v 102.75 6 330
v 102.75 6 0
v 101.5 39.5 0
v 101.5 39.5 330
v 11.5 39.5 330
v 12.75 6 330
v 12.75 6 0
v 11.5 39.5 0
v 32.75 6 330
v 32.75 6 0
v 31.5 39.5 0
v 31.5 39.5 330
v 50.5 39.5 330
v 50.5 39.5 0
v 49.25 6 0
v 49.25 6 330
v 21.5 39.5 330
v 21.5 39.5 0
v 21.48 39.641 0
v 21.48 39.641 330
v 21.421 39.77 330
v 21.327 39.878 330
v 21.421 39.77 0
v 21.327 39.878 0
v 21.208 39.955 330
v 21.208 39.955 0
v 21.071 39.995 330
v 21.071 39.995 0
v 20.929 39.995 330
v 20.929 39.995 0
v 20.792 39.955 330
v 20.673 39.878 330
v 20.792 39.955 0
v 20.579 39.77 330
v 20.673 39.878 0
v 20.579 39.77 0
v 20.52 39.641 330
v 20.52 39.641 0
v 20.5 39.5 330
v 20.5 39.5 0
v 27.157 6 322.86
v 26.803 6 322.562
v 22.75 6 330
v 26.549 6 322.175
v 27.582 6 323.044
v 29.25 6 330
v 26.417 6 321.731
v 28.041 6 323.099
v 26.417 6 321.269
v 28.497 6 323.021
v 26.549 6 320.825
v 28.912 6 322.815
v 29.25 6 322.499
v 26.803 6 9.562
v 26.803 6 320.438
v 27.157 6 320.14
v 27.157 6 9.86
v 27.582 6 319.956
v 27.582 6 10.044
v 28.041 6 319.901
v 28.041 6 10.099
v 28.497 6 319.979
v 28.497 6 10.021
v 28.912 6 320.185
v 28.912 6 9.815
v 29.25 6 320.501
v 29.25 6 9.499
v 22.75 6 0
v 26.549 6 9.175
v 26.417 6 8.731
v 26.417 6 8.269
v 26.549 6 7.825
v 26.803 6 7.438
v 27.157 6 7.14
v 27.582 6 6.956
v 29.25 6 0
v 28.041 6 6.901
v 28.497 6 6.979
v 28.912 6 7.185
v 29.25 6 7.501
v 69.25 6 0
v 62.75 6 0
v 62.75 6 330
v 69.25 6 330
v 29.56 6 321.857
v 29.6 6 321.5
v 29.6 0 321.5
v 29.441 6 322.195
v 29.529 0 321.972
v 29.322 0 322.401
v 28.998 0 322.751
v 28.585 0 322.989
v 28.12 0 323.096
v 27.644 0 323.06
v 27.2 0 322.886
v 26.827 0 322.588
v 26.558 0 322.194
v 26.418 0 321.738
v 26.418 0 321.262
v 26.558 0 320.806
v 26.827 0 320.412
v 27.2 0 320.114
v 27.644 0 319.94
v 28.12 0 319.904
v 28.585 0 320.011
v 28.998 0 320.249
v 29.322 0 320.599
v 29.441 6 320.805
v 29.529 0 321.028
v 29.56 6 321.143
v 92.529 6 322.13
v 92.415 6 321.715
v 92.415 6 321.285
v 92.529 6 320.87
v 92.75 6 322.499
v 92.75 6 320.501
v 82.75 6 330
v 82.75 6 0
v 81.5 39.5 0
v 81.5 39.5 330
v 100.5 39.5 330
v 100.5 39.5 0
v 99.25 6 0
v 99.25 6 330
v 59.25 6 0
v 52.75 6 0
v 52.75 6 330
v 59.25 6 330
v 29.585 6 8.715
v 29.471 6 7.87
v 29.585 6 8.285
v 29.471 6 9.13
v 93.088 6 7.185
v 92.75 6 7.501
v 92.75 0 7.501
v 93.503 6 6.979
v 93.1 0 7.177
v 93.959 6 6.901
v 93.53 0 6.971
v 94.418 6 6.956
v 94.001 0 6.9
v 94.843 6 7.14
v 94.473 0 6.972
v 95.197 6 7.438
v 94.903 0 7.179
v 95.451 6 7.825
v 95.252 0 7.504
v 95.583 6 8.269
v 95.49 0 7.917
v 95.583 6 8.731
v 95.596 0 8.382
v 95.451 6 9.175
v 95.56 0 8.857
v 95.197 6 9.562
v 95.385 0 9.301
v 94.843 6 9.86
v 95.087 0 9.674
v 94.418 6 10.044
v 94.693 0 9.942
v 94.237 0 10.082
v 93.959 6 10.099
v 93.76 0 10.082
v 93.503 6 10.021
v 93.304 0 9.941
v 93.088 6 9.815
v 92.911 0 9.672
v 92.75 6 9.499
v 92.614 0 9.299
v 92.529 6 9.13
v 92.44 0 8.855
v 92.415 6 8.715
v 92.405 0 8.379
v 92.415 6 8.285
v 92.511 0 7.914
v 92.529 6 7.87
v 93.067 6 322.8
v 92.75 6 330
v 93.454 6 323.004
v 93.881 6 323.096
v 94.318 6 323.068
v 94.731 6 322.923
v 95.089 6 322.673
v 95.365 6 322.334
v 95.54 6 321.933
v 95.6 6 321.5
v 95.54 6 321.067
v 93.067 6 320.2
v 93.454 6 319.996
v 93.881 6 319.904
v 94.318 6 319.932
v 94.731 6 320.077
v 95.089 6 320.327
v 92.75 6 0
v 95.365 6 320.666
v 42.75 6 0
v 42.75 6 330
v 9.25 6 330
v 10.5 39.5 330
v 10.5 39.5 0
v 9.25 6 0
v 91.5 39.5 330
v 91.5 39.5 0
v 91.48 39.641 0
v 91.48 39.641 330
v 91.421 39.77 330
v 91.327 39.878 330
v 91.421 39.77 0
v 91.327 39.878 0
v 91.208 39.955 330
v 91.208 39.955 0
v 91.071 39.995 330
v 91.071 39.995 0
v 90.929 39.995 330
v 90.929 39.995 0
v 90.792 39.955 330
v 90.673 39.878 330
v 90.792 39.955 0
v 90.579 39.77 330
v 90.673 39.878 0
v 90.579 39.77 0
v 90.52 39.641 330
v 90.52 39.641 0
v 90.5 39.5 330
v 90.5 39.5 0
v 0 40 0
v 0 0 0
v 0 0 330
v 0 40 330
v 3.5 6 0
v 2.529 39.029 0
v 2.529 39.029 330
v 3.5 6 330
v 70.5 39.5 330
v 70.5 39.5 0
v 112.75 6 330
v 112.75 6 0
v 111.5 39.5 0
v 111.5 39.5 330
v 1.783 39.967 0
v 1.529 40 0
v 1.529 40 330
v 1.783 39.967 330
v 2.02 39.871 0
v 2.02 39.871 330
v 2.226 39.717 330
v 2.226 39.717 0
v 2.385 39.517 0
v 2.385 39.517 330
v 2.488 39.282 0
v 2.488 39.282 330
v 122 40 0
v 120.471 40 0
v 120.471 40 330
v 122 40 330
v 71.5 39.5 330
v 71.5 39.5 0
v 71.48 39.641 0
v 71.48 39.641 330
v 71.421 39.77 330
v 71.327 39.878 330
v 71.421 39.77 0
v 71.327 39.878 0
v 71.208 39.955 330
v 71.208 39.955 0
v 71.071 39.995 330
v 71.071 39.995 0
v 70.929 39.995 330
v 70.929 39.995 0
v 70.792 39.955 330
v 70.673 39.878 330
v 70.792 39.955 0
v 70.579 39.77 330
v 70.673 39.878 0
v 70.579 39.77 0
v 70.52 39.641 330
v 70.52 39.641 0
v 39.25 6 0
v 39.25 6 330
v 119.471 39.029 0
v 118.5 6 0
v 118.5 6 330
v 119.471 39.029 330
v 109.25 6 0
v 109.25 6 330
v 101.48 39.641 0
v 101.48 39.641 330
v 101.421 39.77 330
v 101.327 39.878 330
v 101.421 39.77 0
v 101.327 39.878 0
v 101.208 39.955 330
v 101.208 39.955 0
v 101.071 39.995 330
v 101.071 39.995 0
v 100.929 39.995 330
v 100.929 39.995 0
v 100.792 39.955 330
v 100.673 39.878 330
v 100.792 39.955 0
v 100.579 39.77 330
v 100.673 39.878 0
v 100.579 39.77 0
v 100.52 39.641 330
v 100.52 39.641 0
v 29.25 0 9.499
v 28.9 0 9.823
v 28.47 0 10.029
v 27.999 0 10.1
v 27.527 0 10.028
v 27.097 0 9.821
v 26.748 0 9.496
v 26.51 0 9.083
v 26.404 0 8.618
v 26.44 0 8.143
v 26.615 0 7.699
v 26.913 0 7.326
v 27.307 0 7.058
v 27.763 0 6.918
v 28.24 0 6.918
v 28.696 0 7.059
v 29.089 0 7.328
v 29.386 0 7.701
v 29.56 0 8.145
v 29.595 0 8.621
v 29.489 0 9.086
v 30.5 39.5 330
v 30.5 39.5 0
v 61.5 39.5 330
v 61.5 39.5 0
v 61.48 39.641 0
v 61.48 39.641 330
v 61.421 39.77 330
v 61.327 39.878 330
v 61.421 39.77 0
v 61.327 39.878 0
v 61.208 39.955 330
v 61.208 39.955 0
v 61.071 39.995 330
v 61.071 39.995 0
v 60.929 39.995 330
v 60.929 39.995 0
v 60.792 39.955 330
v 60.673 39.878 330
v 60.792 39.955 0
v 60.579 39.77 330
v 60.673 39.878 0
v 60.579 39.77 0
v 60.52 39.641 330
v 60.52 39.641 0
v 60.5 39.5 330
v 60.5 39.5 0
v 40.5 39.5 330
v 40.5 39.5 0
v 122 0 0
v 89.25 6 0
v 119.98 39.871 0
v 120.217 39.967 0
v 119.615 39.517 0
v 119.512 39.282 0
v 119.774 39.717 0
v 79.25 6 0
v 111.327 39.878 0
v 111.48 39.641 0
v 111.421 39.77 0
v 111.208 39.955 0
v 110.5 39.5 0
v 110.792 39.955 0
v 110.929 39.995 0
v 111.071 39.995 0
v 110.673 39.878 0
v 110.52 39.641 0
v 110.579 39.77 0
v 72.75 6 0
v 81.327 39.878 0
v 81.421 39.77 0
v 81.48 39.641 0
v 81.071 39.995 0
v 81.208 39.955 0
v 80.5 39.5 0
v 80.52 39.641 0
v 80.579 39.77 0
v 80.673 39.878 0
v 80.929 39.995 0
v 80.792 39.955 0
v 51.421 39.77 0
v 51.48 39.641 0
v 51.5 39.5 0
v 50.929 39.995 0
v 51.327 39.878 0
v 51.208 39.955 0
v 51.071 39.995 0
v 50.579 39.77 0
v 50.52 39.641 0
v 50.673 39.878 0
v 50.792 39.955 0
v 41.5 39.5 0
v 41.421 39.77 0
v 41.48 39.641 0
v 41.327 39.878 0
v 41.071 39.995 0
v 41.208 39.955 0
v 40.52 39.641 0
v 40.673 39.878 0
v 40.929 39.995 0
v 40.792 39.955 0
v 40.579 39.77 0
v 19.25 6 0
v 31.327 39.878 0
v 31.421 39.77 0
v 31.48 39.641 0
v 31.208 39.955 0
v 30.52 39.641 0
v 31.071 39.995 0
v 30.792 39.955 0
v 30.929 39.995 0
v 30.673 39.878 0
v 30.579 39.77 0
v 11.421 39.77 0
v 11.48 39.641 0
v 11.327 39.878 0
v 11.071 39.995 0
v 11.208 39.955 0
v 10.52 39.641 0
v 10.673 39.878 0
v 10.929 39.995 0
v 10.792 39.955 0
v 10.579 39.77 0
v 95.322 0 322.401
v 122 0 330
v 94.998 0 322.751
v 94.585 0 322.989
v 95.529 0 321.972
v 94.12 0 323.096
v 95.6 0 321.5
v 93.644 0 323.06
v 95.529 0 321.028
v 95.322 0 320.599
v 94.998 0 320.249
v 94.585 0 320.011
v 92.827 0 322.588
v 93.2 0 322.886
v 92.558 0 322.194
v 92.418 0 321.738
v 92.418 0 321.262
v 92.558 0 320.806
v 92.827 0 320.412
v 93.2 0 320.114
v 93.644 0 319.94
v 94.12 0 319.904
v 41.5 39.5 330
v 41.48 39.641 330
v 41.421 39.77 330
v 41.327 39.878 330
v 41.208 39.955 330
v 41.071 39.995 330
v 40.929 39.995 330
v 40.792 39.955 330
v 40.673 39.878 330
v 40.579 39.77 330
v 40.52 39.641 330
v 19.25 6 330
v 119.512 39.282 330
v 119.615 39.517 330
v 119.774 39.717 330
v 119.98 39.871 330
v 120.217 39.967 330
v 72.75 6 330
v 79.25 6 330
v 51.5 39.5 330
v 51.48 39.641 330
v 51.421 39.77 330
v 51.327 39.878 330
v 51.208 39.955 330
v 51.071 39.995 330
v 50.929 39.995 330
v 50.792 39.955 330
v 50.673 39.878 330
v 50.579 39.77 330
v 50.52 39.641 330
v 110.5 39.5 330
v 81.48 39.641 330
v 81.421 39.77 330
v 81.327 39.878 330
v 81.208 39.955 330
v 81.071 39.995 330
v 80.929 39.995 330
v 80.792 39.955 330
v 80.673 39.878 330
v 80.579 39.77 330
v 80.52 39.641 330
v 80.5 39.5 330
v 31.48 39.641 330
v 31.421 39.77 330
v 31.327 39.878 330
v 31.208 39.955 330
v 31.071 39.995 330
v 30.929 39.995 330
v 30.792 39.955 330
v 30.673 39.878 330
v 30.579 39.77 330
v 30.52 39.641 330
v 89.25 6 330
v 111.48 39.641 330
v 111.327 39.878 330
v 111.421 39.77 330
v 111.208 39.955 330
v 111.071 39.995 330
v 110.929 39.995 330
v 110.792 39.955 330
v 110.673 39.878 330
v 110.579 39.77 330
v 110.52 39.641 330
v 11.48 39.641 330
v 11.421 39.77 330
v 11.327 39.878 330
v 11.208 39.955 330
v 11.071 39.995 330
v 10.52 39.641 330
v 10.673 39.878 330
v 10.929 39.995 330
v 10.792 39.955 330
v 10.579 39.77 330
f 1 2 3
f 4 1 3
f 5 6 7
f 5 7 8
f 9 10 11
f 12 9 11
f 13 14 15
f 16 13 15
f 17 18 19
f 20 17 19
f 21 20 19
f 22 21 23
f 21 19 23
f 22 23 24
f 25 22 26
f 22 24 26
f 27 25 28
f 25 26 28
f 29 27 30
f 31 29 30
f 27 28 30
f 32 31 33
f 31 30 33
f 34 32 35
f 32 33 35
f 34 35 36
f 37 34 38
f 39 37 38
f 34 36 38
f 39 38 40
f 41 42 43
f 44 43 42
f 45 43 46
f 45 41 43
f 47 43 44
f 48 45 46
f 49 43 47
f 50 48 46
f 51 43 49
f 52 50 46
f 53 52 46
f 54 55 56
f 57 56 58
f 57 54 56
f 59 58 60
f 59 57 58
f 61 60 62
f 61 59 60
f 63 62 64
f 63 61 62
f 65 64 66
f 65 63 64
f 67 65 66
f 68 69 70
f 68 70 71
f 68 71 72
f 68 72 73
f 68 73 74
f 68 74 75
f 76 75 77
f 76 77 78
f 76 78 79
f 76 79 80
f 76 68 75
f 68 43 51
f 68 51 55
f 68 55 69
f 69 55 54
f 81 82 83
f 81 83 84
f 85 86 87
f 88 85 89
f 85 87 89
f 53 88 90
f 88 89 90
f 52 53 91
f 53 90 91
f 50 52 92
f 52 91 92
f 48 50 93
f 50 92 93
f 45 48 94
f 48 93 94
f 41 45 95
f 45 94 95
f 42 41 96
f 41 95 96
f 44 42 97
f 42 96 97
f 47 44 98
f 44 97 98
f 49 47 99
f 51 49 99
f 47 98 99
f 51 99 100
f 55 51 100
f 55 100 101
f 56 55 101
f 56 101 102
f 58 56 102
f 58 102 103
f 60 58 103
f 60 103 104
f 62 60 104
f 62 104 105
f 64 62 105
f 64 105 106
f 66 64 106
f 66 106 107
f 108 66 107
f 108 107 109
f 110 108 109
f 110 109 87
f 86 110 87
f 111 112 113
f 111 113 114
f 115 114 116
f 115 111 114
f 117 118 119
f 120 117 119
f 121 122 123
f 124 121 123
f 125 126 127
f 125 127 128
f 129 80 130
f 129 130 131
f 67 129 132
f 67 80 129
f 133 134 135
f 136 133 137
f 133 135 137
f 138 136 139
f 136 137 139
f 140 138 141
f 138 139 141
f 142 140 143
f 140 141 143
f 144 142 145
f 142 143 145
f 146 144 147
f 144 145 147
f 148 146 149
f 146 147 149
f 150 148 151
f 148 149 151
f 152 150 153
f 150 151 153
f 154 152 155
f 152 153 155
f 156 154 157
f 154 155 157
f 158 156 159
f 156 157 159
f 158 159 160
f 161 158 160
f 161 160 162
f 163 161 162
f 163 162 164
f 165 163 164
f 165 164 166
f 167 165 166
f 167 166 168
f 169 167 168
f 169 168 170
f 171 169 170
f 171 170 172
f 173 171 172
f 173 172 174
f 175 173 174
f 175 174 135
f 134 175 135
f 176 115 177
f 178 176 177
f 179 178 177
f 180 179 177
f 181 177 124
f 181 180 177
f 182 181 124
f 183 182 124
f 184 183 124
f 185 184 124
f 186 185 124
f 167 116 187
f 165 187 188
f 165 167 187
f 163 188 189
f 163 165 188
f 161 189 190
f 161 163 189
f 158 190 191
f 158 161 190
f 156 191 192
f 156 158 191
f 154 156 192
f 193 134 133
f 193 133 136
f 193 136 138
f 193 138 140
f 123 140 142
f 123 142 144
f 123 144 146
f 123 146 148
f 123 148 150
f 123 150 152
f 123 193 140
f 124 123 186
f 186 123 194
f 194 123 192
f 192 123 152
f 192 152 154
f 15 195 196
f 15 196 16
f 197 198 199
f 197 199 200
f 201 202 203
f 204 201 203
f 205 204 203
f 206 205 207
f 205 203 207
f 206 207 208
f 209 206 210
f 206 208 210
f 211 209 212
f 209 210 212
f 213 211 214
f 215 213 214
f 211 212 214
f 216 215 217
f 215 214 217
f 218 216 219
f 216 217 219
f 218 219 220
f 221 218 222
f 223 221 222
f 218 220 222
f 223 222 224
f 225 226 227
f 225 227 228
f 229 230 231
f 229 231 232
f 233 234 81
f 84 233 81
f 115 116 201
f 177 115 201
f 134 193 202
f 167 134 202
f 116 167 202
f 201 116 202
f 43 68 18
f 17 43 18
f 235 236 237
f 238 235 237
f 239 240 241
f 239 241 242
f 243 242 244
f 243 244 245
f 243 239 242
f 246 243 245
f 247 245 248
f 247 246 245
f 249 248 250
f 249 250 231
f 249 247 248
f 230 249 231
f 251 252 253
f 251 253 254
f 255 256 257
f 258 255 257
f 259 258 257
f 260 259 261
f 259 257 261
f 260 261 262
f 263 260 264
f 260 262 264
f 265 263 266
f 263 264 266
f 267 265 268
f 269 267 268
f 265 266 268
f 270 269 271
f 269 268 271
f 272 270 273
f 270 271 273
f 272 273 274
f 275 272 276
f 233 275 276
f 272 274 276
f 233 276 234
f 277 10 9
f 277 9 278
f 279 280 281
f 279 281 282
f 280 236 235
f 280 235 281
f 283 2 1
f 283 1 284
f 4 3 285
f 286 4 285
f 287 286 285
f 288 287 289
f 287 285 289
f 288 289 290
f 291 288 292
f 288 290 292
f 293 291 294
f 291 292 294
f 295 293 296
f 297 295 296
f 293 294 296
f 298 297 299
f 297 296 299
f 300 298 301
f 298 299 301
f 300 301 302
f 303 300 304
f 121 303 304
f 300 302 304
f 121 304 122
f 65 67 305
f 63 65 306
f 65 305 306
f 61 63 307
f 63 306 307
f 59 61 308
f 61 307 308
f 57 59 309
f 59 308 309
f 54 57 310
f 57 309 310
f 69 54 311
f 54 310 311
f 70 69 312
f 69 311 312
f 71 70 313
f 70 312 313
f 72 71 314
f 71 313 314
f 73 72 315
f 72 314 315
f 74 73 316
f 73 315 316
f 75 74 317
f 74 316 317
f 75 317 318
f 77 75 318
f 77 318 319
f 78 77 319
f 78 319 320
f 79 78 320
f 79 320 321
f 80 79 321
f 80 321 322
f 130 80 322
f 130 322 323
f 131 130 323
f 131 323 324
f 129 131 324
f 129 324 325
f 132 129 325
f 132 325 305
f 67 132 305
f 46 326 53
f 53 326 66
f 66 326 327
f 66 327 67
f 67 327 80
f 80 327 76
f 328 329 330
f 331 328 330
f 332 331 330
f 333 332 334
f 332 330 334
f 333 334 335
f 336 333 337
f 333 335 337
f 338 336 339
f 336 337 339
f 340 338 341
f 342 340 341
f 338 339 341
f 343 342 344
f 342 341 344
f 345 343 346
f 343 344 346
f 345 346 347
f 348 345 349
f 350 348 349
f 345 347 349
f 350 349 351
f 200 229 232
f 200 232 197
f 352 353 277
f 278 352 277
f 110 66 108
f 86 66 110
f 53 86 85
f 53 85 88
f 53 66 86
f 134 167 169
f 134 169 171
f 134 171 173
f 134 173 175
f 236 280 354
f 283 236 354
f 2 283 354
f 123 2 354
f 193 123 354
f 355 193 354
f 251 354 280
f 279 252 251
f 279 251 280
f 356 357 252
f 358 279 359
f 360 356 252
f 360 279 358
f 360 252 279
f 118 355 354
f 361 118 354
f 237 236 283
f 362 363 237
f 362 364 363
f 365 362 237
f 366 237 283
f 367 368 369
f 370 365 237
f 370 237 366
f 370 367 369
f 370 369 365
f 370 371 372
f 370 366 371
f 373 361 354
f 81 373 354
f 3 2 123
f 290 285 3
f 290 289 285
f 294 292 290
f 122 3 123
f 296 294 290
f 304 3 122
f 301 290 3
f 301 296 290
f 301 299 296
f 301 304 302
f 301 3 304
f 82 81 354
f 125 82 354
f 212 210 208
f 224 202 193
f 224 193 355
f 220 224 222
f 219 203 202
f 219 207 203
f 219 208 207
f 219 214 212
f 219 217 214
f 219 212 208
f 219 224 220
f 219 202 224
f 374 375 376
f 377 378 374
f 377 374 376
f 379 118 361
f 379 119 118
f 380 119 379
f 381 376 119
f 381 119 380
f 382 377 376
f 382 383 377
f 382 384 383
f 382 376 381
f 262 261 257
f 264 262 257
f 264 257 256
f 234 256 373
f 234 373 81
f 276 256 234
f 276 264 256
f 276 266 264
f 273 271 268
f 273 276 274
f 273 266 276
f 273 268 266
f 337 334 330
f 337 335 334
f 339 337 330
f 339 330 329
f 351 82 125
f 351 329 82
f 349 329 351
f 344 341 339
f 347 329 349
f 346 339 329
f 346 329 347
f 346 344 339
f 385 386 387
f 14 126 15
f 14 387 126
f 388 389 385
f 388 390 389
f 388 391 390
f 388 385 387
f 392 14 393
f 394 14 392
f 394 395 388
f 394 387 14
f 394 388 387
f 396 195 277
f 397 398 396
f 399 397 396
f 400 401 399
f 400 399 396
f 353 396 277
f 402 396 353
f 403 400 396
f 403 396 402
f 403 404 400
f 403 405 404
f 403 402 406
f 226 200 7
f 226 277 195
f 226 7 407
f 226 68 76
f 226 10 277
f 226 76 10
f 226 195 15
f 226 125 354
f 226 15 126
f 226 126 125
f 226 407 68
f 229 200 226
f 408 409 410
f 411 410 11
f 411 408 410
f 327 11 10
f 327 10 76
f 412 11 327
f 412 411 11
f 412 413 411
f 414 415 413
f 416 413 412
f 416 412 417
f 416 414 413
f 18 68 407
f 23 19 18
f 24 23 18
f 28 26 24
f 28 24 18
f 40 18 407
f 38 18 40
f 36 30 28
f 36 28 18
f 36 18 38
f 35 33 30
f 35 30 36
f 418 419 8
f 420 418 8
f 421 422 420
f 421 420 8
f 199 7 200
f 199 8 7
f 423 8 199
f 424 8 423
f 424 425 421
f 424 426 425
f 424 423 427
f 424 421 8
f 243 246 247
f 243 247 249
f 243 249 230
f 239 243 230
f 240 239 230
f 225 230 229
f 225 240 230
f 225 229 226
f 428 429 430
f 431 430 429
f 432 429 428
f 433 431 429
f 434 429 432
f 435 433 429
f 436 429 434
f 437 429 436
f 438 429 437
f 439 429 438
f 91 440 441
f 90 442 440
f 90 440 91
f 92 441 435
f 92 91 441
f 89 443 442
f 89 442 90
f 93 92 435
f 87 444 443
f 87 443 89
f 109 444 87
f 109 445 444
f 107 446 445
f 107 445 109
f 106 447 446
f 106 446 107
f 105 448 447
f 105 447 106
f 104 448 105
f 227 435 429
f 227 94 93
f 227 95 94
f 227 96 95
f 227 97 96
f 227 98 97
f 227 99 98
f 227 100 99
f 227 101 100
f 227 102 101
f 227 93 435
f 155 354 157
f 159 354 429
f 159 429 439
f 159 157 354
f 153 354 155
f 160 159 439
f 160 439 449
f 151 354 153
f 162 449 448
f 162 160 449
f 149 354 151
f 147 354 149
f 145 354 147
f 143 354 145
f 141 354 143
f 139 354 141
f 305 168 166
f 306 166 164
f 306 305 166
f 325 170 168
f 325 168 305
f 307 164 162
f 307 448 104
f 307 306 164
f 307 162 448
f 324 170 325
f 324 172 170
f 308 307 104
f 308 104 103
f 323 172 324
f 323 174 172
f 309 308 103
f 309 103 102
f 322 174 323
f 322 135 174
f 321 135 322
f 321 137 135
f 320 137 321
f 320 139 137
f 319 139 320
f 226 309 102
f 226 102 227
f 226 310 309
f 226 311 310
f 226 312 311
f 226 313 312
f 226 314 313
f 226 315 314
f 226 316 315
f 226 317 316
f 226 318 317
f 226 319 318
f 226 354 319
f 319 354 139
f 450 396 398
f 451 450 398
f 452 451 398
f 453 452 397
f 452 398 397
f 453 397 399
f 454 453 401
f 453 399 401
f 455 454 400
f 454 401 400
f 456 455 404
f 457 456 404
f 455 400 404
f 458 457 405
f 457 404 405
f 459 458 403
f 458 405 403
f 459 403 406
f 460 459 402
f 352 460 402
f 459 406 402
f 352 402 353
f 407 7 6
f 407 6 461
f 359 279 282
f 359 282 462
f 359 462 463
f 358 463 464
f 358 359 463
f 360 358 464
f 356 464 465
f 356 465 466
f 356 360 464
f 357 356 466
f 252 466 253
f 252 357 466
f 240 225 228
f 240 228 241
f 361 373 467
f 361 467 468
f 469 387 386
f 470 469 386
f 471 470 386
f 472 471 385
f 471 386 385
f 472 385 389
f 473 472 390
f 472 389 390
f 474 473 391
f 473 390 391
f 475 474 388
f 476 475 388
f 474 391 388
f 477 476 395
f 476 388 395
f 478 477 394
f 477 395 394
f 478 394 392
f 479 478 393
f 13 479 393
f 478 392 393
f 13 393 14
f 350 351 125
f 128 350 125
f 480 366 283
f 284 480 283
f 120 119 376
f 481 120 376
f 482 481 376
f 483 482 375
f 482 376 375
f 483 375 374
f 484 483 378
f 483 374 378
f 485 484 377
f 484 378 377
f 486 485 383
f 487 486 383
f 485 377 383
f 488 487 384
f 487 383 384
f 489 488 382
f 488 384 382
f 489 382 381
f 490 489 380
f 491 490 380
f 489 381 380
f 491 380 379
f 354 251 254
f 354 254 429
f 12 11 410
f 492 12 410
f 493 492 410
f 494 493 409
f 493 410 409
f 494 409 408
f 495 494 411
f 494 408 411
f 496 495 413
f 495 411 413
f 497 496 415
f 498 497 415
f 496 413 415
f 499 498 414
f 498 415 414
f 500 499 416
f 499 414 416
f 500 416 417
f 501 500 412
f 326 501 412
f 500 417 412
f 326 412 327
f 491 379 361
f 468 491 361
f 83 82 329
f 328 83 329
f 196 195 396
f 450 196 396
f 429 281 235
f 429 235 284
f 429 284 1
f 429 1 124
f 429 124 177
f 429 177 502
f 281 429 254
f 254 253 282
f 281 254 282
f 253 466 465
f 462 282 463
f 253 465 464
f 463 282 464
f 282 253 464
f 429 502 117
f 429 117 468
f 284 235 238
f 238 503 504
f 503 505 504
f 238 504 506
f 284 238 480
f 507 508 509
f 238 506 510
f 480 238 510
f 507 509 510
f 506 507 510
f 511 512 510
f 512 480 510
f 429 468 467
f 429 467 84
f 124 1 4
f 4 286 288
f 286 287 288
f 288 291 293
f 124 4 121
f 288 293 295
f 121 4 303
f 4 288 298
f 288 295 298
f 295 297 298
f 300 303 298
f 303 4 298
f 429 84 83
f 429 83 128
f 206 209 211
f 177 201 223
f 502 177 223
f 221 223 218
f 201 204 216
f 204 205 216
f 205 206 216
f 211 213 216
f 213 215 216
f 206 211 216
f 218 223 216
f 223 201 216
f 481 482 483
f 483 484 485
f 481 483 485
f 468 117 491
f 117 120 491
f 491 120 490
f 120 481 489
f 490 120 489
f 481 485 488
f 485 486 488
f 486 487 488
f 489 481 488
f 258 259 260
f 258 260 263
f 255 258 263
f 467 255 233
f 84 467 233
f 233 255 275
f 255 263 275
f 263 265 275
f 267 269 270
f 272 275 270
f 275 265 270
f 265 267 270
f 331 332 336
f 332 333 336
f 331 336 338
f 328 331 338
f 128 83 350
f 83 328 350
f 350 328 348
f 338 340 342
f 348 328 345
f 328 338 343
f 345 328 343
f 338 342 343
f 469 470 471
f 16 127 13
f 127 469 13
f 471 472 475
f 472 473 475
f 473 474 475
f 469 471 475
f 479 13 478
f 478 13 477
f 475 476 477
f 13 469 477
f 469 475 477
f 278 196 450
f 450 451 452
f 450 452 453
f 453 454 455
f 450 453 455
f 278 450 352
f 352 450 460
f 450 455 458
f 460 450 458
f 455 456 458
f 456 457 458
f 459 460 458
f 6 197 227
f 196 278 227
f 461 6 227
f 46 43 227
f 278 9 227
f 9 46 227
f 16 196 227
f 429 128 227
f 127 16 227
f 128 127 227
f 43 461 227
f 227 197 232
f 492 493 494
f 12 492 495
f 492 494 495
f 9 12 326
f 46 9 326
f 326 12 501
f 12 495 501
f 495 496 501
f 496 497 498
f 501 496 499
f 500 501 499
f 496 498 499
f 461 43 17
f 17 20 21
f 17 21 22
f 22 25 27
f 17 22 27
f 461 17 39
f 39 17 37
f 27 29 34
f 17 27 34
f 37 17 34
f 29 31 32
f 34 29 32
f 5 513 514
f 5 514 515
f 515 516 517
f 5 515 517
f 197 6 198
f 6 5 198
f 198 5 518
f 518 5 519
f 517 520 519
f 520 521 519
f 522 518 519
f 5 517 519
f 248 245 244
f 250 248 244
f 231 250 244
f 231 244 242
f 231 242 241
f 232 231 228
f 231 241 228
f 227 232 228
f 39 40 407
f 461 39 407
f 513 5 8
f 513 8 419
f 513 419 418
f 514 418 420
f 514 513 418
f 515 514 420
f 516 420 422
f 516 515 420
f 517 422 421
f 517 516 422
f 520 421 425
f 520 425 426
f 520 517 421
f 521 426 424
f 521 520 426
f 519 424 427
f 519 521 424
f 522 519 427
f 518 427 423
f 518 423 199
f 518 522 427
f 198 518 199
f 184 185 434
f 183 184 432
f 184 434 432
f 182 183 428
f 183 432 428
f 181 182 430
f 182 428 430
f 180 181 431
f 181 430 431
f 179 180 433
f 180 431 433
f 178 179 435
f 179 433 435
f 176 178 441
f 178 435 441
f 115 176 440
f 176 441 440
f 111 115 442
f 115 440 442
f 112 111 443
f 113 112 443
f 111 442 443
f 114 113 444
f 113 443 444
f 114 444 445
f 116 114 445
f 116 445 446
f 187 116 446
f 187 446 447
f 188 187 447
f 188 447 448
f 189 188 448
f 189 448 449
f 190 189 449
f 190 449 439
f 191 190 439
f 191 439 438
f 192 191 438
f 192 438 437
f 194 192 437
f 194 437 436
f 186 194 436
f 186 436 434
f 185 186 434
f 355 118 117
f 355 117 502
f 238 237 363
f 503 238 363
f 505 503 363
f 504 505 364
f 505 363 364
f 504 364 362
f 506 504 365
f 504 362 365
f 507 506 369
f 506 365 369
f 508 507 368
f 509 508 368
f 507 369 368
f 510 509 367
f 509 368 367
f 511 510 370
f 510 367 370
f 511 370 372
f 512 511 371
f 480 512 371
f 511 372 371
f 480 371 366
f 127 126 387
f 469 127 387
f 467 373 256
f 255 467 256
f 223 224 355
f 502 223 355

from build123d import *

# Parameters (mm, degrees)
EXTRUDE_1_DEPTH       = 330
EXTRUDE_3_DEPTH       = 330
PATTERN_CURVE_1_COUNT = 11
PATTERN_CURVE_1_PITCH = 10
SKETCH_3_R            = 1.6
CUT_EXTRUDE_1_DEPTH   = 6


with BuildPart() as part:
    # Эскиз1 → Вытянуть1 (new body)
    with BuildSketch(Plane.XY):
        with BuildLine():
            Line((0, 40), (1.528979332, 40))
            ThreePointArc((1.528979332, 40), (2.225614441, 39.717425624), (2.528547087, 39.029399052))
            Line((2.528547087, 39.029399052), (3.5, 6))
            Line((3.5, 6), (118.5, 6))
            Line((118.5, 6), (119.471452913, 39.029399052))
            ThreePointArc((119.471452913, 39.029399052), (119.774385559, 39.717425624), (120.471020668, 40))
            Line((120.471020668, 40), (122, 40))
            Line((122, 40), (122, 0))
            Line((122, 0), (0, 0))
            Line((0, 0), (0, 40))
        make_face()
    extrude(amount=EXTRUDE_1_DEPTH)

    # Эскиз2 → Вытянуть3 (add)
    with BuildSketch(Plane.XY.offset(330)):
        with BuildLine():
            Line((10.5, 39.5), (9.25, 6))
            Line((9.25, 6), (12.75, 6))
            Line((12.75, 6), (11.5, 39.5))
            ThreePointArc((11.5, 39.5), (11, 40), (10.5, 39.5))
        make_face()
    extrude_3 = extrude(amount=-EXTRUDE_3_DEPTH)

    # Кривая1: Вытянуть3 ×11
    with Locations(*[(i * PATTERN_CURVE_1_PITCH, 0, 0) for i in range(1, PATTERN_CURVE_1_COUNT)]):
        add(extrude_3)

    # Эскиз3 → Вырез-Вытянуть1 (cut)
    with BuildSketch(Plane.XZ):
        with Locations((28, 321.5)):
            Circle(SKETCH_3_R)
        with Locations((94, 321.5)):
            Circle(SKETCH_3_R)
        with Locations((94, 8.5)):
            Circle(SKETCH_3_R)
        with Locations((28, 8.5)):
            Circle(SKETCH_3_R)
    extrude(amount=-CUT_EXTRUDE_1_DEPTH, mode=Mode.SUBTRACT)


solid = part.part
